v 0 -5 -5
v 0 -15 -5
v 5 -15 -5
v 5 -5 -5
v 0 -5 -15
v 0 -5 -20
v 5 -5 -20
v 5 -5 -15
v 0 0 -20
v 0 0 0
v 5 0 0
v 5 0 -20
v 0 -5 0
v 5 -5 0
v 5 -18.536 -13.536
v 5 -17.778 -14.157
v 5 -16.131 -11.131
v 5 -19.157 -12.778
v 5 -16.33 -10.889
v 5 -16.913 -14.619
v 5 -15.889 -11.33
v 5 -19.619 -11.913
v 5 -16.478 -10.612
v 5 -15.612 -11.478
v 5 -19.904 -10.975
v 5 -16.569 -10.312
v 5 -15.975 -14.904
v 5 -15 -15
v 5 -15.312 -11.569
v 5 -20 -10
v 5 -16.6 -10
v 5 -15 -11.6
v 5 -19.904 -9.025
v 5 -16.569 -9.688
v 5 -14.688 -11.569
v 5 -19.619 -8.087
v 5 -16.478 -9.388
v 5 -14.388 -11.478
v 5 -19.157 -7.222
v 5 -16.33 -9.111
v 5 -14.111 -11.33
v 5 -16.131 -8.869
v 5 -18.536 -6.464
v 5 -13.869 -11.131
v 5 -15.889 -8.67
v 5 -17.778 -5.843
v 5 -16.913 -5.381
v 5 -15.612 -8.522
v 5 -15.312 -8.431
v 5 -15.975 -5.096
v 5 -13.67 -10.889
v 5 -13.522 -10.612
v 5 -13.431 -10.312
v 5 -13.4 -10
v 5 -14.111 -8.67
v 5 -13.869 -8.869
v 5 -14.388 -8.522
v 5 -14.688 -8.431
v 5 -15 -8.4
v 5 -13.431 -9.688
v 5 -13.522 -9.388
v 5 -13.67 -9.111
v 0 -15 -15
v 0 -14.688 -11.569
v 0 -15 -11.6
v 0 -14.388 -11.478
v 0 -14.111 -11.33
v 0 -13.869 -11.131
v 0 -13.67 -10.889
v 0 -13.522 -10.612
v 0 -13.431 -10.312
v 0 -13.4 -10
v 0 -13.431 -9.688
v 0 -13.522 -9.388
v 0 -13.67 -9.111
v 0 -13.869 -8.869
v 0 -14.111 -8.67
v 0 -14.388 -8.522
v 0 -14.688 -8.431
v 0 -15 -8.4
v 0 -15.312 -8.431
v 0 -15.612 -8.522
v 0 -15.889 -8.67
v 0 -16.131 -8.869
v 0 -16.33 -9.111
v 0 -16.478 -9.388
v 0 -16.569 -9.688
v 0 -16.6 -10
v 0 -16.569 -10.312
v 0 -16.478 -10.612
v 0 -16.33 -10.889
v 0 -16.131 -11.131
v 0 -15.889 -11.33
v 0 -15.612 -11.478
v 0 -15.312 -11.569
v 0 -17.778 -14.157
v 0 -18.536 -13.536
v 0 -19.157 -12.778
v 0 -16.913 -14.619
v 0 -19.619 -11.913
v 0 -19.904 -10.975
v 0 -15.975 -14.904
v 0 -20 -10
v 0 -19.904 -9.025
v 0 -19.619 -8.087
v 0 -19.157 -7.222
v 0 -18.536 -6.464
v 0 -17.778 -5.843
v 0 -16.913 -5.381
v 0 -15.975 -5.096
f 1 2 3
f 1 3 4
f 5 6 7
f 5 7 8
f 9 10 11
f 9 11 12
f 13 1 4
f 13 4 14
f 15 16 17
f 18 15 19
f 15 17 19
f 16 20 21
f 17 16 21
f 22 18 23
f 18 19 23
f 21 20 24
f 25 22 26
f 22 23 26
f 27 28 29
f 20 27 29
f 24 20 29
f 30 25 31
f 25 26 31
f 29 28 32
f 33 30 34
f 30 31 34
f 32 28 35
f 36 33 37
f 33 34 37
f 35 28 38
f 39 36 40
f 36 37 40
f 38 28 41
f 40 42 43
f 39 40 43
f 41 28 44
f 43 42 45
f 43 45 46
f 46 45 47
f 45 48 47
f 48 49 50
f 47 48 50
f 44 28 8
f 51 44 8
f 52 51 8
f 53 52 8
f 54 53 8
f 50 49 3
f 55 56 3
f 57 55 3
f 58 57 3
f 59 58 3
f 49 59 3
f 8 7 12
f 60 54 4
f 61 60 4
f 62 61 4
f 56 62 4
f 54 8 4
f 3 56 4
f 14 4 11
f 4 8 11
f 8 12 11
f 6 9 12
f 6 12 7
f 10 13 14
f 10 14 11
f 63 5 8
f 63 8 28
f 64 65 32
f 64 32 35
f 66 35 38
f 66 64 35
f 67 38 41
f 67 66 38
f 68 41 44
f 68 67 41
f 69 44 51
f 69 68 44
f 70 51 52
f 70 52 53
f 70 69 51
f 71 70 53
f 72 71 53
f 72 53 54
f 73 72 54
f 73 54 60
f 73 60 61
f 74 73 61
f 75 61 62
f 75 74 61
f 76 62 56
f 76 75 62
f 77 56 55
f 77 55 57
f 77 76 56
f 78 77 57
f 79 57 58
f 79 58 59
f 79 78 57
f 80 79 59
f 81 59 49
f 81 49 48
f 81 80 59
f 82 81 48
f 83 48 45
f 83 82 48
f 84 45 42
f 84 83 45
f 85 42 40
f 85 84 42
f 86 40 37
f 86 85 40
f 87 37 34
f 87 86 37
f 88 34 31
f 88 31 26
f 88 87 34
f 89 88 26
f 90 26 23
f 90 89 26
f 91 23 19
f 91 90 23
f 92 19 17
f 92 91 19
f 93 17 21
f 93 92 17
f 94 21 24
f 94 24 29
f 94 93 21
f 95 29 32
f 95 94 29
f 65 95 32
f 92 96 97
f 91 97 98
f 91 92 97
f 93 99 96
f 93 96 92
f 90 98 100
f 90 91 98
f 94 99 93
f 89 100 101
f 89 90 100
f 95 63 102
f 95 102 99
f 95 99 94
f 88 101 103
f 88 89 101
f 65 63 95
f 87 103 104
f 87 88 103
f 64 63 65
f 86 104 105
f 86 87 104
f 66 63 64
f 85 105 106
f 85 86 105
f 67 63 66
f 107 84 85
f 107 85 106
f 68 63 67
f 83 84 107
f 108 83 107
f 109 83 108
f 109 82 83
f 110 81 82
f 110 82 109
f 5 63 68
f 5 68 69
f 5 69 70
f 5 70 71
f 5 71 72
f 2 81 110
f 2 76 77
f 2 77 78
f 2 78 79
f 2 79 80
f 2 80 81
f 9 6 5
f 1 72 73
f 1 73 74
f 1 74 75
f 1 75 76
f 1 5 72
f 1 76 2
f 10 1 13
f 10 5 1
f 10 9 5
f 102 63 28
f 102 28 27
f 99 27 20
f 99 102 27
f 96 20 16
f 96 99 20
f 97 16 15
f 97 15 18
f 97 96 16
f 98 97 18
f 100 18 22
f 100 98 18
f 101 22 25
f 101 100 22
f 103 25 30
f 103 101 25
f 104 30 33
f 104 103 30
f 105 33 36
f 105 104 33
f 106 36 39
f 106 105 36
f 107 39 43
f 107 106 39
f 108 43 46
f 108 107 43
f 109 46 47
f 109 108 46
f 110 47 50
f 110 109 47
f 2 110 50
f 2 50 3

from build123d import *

# Parameters (mm, degrees)
SKETCH_3_R      = 1.6
EXTRUDE_1_DEPTH = 5


with BuildPart() as part:
    # 草图3 → 凸台-拉伸1 (new body)
    with BuildSketch(Plane(origin=(0, 0, 0), x_dir=(0, 0, -1), z_dir=(1, 0, 0))):
        with BuildLine():
            Line((0, 0), (20, 0))
            Line((20, 0), (20, -5))
            Line((20, -5), (15, -5))
            Line((15, -5), (15, -15))
            ThreePointArc((15, -15), (10, -20), (5, -15))
            Line((5, -15), (5, -5))
            Line((5, -5), (0, -5))
            Line((0, -5), (0, 0))
        make_face()
        with Locations((10, -15)):
            Circle(SKETCH_3_R, mode=Mode.SUBTRACT)
    extrude(amount=EXTRUDE_1_DEPTH)


solid = part.part
